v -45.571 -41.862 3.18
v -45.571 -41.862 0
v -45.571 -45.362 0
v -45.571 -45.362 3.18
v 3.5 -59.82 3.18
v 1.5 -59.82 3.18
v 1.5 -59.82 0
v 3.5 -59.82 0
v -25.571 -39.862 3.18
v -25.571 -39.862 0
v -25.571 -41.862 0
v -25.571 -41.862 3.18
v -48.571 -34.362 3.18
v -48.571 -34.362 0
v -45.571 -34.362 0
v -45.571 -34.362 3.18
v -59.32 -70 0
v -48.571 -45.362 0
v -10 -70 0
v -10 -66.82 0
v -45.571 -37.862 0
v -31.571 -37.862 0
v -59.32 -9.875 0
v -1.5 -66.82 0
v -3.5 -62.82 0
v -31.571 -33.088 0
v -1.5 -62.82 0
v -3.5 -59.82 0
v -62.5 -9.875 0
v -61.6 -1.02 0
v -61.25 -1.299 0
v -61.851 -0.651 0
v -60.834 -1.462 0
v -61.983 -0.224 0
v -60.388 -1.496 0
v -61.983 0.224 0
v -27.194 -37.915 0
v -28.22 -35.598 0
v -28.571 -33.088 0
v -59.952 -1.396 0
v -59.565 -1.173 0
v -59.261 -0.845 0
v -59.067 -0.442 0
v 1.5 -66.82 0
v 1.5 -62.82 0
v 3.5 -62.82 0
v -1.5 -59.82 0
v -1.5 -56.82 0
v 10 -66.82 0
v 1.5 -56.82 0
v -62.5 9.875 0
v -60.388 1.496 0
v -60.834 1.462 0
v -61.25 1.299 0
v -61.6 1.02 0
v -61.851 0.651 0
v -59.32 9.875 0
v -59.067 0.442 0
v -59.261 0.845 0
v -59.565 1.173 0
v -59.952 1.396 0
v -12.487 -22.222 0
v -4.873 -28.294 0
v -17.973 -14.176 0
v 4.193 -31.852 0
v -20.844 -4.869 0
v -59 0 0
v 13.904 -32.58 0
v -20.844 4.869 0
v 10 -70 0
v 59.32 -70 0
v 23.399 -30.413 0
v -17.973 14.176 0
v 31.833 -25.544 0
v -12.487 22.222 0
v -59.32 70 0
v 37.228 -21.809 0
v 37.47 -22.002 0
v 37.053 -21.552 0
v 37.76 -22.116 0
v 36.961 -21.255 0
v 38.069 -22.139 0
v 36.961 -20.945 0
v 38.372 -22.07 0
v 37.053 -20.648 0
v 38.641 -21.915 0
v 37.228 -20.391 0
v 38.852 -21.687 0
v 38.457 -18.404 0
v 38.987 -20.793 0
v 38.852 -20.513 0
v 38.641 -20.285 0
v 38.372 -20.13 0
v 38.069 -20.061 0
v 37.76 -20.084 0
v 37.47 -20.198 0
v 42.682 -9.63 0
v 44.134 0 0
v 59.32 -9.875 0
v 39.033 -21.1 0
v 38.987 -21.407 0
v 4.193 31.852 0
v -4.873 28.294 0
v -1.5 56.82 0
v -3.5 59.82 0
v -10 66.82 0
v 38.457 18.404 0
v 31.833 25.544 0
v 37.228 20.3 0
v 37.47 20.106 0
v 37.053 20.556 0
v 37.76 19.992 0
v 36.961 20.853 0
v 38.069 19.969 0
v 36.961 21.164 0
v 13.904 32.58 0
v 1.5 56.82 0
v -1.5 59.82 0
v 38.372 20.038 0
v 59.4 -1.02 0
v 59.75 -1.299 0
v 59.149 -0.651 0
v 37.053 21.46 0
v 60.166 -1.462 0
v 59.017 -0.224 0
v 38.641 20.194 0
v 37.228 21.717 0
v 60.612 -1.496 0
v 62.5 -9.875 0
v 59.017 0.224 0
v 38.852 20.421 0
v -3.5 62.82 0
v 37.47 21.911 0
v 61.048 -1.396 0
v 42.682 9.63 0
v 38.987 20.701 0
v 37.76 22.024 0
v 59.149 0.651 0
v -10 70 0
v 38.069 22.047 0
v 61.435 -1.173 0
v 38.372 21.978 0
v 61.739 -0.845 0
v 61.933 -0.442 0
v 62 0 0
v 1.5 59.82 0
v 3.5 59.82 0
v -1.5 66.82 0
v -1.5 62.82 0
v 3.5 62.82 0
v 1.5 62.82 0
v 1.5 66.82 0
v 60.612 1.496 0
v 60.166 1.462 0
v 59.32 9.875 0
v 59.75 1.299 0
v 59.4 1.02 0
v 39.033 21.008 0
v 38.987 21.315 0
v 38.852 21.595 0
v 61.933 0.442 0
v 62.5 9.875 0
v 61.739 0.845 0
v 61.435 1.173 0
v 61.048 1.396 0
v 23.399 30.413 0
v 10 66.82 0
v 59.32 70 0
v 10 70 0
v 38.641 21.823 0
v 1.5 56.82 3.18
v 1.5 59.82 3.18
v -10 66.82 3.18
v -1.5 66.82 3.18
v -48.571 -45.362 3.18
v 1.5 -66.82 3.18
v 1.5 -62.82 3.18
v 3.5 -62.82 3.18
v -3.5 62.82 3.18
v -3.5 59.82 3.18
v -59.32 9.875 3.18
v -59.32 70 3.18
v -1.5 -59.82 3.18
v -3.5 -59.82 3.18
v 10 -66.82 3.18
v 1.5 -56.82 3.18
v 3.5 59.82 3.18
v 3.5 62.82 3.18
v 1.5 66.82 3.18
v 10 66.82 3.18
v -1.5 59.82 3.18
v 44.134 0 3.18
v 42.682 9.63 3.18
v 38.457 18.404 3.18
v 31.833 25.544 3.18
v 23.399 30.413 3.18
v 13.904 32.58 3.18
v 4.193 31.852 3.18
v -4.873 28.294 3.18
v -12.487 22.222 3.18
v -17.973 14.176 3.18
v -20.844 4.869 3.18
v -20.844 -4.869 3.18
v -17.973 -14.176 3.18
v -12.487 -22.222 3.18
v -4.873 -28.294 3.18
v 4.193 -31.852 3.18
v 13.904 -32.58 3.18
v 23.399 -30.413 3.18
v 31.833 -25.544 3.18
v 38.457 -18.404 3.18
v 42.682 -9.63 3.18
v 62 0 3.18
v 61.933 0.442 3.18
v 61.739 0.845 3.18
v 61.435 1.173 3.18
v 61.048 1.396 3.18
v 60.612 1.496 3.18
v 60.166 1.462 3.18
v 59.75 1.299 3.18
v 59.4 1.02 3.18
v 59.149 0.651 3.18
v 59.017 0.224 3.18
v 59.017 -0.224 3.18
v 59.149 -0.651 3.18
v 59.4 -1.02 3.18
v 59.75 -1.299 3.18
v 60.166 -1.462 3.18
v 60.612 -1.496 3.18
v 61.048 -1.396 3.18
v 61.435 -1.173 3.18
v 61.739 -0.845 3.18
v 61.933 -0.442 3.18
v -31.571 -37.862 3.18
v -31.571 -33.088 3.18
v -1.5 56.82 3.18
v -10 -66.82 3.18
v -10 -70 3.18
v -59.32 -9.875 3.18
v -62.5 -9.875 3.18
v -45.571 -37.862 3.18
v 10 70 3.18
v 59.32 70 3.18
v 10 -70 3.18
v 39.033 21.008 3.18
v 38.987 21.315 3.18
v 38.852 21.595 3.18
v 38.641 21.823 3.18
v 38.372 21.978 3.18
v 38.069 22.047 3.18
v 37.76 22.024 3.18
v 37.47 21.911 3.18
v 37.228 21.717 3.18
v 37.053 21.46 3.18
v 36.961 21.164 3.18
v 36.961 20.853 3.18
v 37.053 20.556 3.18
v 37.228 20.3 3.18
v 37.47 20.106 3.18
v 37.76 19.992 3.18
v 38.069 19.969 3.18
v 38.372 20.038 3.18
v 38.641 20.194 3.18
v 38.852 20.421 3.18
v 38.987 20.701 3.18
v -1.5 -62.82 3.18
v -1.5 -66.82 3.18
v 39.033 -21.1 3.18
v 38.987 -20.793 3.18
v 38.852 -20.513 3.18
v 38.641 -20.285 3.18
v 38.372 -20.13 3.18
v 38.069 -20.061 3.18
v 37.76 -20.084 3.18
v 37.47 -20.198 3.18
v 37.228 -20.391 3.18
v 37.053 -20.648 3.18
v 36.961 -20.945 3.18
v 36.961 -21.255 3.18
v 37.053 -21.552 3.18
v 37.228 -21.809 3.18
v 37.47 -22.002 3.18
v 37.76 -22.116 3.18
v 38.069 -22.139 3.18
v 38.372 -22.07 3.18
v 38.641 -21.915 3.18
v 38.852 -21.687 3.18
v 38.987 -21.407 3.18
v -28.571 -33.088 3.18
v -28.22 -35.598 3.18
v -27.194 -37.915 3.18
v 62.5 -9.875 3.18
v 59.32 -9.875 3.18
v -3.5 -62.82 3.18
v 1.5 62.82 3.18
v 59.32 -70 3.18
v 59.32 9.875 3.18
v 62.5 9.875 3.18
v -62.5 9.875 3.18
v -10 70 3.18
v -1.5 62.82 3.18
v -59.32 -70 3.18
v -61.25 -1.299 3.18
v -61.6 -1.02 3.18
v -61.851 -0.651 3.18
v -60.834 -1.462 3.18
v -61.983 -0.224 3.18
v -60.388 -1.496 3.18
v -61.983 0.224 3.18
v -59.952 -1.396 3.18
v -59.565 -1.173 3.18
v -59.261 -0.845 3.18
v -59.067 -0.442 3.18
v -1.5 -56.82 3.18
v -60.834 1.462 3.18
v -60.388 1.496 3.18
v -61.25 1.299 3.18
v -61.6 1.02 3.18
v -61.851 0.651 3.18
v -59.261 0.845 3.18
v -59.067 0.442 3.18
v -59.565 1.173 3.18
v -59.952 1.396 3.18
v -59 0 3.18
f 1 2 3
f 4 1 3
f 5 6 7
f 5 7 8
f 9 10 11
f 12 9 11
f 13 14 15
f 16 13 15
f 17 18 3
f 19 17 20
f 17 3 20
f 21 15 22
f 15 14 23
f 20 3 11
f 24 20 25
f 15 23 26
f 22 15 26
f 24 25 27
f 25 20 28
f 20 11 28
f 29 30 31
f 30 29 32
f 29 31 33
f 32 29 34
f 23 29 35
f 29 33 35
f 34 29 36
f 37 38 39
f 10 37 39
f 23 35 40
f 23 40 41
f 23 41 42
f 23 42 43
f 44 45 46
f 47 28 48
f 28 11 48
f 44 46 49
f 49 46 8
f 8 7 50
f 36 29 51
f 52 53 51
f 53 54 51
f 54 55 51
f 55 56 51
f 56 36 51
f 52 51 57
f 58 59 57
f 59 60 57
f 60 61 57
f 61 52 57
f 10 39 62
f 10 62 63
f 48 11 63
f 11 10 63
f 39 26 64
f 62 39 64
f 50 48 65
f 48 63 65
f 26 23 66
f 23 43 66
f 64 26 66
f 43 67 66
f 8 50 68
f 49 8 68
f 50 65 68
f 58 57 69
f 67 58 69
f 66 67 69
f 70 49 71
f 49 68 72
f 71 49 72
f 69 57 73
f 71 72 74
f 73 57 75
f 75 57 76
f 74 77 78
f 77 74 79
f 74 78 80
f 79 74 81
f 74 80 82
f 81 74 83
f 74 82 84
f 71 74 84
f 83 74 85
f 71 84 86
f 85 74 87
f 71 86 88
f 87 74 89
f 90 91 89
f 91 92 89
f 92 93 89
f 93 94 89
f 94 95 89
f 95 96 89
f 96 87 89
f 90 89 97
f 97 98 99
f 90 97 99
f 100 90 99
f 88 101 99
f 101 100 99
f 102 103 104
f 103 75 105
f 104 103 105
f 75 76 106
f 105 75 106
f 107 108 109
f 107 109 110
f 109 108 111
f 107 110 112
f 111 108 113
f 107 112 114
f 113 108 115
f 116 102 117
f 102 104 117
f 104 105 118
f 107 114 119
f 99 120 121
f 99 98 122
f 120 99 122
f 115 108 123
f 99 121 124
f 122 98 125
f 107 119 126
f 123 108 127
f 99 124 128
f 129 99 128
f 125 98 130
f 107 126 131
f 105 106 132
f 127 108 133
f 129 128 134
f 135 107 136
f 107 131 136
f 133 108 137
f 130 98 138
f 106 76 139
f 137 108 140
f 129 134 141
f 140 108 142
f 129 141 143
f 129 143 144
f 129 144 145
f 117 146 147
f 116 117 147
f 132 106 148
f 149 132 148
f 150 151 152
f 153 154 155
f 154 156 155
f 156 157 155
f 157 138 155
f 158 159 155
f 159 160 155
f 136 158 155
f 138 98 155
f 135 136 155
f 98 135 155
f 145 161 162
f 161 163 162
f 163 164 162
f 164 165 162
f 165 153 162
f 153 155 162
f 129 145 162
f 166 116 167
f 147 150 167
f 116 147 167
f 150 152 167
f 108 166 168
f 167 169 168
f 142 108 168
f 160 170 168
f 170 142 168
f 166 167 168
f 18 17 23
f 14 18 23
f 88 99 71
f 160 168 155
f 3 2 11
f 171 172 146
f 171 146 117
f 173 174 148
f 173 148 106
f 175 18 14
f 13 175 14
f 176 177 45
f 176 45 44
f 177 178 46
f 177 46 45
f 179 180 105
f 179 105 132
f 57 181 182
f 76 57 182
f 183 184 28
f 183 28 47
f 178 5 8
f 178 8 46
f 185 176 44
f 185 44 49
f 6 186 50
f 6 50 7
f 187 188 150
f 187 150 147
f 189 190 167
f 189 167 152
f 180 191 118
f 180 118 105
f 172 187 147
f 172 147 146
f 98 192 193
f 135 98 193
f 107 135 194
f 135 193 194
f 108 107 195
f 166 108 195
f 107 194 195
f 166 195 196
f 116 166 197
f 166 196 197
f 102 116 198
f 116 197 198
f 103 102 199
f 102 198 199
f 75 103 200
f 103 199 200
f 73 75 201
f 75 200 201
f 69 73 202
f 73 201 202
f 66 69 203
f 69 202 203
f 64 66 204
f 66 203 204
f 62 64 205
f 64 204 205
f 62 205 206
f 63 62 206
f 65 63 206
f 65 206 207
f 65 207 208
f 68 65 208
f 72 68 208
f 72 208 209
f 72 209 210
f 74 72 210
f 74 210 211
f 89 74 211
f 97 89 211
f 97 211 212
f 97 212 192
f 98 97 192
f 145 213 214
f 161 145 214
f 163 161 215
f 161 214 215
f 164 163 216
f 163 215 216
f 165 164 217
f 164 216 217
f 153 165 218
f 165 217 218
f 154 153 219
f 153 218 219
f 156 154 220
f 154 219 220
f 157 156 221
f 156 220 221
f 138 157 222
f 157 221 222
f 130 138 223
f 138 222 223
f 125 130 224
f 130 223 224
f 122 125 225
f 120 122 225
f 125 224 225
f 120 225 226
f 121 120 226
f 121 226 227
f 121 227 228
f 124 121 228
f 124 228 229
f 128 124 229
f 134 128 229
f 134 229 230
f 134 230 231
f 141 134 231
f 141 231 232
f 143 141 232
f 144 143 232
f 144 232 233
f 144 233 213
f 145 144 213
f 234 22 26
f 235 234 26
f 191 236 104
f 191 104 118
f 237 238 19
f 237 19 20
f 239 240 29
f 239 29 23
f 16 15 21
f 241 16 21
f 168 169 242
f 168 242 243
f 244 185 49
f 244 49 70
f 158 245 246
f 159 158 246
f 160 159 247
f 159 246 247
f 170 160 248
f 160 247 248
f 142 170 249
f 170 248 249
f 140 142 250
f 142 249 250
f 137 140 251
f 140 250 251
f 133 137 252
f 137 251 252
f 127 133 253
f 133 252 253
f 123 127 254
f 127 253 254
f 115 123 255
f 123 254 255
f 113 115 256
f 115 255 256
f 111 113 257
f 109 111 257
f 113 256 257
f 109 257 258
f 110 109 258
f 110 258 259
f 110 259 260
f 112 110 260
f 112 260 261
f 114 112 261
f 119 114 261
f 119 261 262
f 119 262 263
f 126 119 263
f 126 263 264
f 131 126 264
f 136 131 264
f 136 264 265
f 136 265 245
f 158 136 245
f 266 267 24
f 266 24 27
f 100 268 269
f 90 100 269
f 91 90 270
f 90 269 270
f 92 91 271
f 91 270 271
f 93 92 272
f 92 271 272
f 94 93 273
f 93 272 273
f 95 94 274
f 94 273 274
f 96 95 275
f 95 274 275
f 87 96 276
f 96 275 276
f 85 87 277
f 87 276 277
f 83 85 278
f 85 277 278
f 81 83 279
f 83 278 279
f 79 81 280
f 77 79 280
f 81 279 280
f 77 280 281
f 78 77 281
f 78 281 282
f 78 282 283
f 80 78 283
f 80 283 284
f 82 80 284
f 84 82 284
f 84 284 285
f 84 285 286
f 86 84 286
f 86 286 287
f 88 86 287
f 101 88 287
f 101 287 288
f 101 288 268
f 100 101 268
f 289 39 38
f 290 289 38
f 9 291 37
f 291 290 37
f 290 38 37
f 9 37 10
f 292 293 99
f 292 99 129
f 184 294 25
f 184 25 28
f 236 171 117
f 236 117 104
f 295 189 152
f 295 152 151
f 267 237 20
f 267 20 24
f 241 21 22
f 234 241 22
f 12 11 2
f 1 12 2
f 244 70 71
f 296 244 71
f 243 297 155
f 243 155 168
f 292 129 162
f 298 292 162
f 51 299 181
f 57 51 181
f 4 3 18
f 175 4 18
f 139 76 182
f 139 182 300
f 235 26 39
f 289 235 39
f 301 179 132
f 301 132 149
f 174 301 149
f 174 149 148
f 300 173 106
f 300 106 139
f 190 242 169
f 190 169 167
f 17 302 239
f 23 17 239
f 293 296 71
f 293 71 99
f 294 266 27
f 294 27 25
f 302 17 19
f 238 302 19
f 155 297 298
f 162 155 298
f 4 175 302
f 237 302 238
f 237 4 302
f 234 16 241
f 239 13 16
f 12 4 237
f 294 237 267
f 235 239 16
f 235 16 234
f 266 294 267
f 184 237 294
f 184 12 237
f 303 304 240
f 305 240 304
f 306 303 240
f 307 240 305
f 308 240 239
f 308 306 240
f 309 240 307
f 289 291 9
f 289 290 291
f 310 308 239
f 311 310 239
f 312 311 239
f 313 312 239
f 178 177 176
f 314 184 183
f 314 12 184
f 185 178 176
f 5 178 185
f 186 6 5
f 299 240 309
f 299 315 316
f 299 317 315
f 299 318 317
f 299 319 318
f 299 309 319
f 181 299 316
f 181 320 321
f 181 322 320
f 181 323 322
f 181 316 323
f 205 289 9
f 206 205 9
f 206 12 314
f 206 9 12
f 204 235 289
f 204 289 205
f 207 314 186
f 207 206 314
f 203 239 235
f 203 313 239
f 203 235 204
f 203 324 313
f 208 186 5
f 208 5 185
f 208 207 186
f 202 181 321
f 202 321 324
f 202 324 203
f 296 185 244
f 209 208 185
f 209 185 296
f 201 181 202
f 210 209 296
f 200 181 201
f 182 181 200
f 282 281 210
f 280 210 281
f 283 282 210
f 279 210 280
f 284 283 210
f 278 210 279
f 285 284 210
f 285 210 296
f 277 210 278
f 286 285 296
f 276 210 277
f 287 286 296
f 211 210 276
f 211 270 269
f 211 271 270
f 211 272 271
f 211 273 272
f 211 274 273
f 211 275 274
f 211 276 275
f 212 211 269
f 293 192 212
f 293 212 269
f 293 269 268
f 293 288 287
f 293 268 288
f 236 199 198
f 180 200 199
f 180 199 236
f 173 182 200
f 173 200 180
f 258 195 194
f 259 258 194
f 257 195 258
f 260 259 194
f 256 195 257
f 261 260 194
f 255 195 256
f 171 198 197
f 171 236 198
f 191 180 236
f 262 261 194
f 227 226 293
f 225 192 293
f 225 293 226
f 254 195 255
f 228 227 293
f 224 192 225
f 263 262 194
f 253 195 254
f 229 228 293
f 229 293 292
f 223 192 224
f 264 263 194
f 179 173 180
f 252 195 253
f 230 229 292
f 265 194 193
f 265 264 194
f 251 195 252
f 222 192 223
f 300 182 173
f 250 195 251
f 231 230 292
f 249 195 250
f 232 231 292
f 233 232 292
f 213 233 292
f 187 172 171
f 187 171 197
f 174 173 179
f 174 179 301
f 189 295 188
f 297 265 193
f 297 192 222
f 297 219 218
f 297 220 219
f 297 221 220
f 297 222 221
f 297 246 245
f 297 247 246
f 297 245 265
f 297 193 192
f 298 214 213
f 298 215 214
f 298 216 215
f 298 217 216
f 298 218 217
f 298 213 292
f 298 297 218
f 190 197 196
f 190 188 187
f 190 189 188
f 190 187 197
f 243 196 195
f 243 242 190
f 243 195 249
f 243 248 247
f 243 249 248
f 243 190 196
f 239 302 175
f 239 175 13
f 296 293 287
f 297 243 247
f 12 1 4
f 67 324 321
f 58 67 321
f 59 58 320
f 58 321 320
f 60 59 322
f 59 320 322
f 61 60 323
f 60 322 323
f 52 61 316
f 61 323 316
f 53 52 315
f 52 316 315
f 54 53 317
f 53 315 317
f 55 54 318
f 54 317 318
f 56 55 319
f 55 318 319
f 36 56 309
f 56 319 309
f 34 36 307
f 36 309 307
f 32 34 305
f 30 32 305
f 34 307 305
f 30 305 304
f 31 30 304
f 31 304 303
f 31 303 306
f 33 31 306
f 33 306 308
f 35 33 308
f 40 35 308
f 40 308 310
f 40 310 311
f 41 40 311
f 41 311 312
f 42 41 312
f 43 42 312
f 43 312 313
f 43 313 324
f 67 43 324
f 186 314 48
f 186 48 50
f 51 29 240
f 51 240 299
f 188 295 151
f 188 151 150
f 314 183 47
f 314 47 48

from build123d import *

# Parameters (mm, degrees)
SKETCH1_W           = 125
SKETCH1_H           = 140
BOSS_EXTRUDE1_DEPTH = 3.18
SKETCH2_R           = 1.5
SKETCH2_W           = 3.18
SKETCH2_H           = 60.125
CUT_EXTRUDE1_DEPTH  = 4.18
CUT_EXTRUDE5_DEPTH  = 12
SKETCH5_R           = 32.671394307
CUT_EXTRUDE6_DEPTH  = 10
SKETCH9_R           = 1.042012373
CUT_EXTRUDE8_DEPTH  = 4.18


with BuildPart() as part:
    # Sketch1 → Boss-Extrude1 (new body)
    with BuildSketch(Plane.XY):
        Rectangle(SKETCH1_W, SKETCH1_H)
    extrude(amount=BOSS_EXTRUDE1_DEPTH)

    # Sketch2 → Cut-Extrude1 (cut, through all)
    with BuildSketch(Plane.XY.offset(3.18)):
        with Locations((-60.5, 0)):
            Circle(SKETCH2_R)
        with Locations((60.5, 0)):
            Circle(SKETCH2_R)
        Polygon((-10, 70), (10, 70), (10, 66.82), (1.5, 66.82), (1.5, 62.82), (3.5, 62.82), (3.5, 59.82), (1.5, 59.82), (1.5, 56.82), (-1.5, 56.82), (-1.5, 59.82), (-3.5, 59.82), (-3.5, 62.82), (-1.5, 62.82), (-1.5, 66.82), (-10, 66.82), align=None)
        Polygon((-10, -70), (-10, -66.82), (-1.5, -66.82), (-1.5, -62.82), (-3.5, -62.82), (-3.5, -59.82), (-1.5, -59.82), (-1.5, -56.82), (1.5, -56.82), (1.5, -59.82), (3.5, -59.82), (3.5, -62.82), (1.5, -62.82), (1.5, -66.82), (10, -66.82), (10, -70), align=None)
        with Locations((-60.91, 39.9375)):
            Rectangle(SKETCH2_W, SKETCH2_H)
        with Locations((-60.91, -39.9375)):
            Rectangle(SKETCH2_W, SKETCH2_H)
        with Locations((60.91, -39.9375)):
            Rectangle(SKETCH2_W, SKETCH2_H)
        with Locations((60.91, 39.9375)):
            Rectangle(SKETCH2_W, SKETCH2_H)
    extrude(amount=-CUT_EXTRUDE1_DEPTH, mode=Mode.SUBTRACT)

    # Sketch4 → Cut-Extrude5 (cut)
    with BuildSketch(Plane.XY):
        with BuildLine():
            Line((-25.57107609, -41.8625), (-45.57107609, -41.8625))
            Line((-45.57107609, -41.8625), (-45.57107609, -45.3625))
            Line((-45.57107609, -45.3625), (-48.57107609, -45.3625))
            Line((-48.57107609, -45.3625), (-48.57107609, -34.3625))
            Line((-48.57107609, -34.3625), (-45.57107609, -34.3625))
            Line((-45.57107609, -34.3625), (-45.57107609, -37.8625))
            Line((-45.57107609, -37.8625), (-31.57107609, -37.8625))
            Line((-31.57107609, -37.8625), (-31.57107609, -33.087601989))
            Line((-31.57107609, -33.087601989), (-28.57107609, -33.087601989))
            ThreePointArc((-28.57107609, -33.087601989), (-27.787526444, -36.79230316), (-25.57107609, -39.8625))
            Line((-25.57107609, -39.8625), (-25.57107609, -41.8625))
        make_face()
    extrude(amount=CUT_EXTRUDE5_DEPTH, mode=Mode.SUBTRACT)

    # Sketch5 → Cut-Extrude6 (cut)
    with BuildSketch(Plane.XY.offset(3.18)):
        with Locations((11.462576996, 0)):
            Circle(SKETCH5_R)
    extrude(amount=-CUT_EXTRUDE6_DEPTH, mode=Mode.SUBTRACT)

    # Sketch9 → Cut-Extrude8 (cut, through all)
    with BuildSketch(Plane.XY.offset(3.18)):
        with Locations((37.991387583, -21.1)):
            Circle(SKETCH9_R)
        with Locations((37.991387583, 21.008299604)):
            Circle(SKETCH9_R)
    extrude(amount=-CUT_EXTRUDE8_DEPTH, mode=Mode.SUBTRACT)


solid = part.part
